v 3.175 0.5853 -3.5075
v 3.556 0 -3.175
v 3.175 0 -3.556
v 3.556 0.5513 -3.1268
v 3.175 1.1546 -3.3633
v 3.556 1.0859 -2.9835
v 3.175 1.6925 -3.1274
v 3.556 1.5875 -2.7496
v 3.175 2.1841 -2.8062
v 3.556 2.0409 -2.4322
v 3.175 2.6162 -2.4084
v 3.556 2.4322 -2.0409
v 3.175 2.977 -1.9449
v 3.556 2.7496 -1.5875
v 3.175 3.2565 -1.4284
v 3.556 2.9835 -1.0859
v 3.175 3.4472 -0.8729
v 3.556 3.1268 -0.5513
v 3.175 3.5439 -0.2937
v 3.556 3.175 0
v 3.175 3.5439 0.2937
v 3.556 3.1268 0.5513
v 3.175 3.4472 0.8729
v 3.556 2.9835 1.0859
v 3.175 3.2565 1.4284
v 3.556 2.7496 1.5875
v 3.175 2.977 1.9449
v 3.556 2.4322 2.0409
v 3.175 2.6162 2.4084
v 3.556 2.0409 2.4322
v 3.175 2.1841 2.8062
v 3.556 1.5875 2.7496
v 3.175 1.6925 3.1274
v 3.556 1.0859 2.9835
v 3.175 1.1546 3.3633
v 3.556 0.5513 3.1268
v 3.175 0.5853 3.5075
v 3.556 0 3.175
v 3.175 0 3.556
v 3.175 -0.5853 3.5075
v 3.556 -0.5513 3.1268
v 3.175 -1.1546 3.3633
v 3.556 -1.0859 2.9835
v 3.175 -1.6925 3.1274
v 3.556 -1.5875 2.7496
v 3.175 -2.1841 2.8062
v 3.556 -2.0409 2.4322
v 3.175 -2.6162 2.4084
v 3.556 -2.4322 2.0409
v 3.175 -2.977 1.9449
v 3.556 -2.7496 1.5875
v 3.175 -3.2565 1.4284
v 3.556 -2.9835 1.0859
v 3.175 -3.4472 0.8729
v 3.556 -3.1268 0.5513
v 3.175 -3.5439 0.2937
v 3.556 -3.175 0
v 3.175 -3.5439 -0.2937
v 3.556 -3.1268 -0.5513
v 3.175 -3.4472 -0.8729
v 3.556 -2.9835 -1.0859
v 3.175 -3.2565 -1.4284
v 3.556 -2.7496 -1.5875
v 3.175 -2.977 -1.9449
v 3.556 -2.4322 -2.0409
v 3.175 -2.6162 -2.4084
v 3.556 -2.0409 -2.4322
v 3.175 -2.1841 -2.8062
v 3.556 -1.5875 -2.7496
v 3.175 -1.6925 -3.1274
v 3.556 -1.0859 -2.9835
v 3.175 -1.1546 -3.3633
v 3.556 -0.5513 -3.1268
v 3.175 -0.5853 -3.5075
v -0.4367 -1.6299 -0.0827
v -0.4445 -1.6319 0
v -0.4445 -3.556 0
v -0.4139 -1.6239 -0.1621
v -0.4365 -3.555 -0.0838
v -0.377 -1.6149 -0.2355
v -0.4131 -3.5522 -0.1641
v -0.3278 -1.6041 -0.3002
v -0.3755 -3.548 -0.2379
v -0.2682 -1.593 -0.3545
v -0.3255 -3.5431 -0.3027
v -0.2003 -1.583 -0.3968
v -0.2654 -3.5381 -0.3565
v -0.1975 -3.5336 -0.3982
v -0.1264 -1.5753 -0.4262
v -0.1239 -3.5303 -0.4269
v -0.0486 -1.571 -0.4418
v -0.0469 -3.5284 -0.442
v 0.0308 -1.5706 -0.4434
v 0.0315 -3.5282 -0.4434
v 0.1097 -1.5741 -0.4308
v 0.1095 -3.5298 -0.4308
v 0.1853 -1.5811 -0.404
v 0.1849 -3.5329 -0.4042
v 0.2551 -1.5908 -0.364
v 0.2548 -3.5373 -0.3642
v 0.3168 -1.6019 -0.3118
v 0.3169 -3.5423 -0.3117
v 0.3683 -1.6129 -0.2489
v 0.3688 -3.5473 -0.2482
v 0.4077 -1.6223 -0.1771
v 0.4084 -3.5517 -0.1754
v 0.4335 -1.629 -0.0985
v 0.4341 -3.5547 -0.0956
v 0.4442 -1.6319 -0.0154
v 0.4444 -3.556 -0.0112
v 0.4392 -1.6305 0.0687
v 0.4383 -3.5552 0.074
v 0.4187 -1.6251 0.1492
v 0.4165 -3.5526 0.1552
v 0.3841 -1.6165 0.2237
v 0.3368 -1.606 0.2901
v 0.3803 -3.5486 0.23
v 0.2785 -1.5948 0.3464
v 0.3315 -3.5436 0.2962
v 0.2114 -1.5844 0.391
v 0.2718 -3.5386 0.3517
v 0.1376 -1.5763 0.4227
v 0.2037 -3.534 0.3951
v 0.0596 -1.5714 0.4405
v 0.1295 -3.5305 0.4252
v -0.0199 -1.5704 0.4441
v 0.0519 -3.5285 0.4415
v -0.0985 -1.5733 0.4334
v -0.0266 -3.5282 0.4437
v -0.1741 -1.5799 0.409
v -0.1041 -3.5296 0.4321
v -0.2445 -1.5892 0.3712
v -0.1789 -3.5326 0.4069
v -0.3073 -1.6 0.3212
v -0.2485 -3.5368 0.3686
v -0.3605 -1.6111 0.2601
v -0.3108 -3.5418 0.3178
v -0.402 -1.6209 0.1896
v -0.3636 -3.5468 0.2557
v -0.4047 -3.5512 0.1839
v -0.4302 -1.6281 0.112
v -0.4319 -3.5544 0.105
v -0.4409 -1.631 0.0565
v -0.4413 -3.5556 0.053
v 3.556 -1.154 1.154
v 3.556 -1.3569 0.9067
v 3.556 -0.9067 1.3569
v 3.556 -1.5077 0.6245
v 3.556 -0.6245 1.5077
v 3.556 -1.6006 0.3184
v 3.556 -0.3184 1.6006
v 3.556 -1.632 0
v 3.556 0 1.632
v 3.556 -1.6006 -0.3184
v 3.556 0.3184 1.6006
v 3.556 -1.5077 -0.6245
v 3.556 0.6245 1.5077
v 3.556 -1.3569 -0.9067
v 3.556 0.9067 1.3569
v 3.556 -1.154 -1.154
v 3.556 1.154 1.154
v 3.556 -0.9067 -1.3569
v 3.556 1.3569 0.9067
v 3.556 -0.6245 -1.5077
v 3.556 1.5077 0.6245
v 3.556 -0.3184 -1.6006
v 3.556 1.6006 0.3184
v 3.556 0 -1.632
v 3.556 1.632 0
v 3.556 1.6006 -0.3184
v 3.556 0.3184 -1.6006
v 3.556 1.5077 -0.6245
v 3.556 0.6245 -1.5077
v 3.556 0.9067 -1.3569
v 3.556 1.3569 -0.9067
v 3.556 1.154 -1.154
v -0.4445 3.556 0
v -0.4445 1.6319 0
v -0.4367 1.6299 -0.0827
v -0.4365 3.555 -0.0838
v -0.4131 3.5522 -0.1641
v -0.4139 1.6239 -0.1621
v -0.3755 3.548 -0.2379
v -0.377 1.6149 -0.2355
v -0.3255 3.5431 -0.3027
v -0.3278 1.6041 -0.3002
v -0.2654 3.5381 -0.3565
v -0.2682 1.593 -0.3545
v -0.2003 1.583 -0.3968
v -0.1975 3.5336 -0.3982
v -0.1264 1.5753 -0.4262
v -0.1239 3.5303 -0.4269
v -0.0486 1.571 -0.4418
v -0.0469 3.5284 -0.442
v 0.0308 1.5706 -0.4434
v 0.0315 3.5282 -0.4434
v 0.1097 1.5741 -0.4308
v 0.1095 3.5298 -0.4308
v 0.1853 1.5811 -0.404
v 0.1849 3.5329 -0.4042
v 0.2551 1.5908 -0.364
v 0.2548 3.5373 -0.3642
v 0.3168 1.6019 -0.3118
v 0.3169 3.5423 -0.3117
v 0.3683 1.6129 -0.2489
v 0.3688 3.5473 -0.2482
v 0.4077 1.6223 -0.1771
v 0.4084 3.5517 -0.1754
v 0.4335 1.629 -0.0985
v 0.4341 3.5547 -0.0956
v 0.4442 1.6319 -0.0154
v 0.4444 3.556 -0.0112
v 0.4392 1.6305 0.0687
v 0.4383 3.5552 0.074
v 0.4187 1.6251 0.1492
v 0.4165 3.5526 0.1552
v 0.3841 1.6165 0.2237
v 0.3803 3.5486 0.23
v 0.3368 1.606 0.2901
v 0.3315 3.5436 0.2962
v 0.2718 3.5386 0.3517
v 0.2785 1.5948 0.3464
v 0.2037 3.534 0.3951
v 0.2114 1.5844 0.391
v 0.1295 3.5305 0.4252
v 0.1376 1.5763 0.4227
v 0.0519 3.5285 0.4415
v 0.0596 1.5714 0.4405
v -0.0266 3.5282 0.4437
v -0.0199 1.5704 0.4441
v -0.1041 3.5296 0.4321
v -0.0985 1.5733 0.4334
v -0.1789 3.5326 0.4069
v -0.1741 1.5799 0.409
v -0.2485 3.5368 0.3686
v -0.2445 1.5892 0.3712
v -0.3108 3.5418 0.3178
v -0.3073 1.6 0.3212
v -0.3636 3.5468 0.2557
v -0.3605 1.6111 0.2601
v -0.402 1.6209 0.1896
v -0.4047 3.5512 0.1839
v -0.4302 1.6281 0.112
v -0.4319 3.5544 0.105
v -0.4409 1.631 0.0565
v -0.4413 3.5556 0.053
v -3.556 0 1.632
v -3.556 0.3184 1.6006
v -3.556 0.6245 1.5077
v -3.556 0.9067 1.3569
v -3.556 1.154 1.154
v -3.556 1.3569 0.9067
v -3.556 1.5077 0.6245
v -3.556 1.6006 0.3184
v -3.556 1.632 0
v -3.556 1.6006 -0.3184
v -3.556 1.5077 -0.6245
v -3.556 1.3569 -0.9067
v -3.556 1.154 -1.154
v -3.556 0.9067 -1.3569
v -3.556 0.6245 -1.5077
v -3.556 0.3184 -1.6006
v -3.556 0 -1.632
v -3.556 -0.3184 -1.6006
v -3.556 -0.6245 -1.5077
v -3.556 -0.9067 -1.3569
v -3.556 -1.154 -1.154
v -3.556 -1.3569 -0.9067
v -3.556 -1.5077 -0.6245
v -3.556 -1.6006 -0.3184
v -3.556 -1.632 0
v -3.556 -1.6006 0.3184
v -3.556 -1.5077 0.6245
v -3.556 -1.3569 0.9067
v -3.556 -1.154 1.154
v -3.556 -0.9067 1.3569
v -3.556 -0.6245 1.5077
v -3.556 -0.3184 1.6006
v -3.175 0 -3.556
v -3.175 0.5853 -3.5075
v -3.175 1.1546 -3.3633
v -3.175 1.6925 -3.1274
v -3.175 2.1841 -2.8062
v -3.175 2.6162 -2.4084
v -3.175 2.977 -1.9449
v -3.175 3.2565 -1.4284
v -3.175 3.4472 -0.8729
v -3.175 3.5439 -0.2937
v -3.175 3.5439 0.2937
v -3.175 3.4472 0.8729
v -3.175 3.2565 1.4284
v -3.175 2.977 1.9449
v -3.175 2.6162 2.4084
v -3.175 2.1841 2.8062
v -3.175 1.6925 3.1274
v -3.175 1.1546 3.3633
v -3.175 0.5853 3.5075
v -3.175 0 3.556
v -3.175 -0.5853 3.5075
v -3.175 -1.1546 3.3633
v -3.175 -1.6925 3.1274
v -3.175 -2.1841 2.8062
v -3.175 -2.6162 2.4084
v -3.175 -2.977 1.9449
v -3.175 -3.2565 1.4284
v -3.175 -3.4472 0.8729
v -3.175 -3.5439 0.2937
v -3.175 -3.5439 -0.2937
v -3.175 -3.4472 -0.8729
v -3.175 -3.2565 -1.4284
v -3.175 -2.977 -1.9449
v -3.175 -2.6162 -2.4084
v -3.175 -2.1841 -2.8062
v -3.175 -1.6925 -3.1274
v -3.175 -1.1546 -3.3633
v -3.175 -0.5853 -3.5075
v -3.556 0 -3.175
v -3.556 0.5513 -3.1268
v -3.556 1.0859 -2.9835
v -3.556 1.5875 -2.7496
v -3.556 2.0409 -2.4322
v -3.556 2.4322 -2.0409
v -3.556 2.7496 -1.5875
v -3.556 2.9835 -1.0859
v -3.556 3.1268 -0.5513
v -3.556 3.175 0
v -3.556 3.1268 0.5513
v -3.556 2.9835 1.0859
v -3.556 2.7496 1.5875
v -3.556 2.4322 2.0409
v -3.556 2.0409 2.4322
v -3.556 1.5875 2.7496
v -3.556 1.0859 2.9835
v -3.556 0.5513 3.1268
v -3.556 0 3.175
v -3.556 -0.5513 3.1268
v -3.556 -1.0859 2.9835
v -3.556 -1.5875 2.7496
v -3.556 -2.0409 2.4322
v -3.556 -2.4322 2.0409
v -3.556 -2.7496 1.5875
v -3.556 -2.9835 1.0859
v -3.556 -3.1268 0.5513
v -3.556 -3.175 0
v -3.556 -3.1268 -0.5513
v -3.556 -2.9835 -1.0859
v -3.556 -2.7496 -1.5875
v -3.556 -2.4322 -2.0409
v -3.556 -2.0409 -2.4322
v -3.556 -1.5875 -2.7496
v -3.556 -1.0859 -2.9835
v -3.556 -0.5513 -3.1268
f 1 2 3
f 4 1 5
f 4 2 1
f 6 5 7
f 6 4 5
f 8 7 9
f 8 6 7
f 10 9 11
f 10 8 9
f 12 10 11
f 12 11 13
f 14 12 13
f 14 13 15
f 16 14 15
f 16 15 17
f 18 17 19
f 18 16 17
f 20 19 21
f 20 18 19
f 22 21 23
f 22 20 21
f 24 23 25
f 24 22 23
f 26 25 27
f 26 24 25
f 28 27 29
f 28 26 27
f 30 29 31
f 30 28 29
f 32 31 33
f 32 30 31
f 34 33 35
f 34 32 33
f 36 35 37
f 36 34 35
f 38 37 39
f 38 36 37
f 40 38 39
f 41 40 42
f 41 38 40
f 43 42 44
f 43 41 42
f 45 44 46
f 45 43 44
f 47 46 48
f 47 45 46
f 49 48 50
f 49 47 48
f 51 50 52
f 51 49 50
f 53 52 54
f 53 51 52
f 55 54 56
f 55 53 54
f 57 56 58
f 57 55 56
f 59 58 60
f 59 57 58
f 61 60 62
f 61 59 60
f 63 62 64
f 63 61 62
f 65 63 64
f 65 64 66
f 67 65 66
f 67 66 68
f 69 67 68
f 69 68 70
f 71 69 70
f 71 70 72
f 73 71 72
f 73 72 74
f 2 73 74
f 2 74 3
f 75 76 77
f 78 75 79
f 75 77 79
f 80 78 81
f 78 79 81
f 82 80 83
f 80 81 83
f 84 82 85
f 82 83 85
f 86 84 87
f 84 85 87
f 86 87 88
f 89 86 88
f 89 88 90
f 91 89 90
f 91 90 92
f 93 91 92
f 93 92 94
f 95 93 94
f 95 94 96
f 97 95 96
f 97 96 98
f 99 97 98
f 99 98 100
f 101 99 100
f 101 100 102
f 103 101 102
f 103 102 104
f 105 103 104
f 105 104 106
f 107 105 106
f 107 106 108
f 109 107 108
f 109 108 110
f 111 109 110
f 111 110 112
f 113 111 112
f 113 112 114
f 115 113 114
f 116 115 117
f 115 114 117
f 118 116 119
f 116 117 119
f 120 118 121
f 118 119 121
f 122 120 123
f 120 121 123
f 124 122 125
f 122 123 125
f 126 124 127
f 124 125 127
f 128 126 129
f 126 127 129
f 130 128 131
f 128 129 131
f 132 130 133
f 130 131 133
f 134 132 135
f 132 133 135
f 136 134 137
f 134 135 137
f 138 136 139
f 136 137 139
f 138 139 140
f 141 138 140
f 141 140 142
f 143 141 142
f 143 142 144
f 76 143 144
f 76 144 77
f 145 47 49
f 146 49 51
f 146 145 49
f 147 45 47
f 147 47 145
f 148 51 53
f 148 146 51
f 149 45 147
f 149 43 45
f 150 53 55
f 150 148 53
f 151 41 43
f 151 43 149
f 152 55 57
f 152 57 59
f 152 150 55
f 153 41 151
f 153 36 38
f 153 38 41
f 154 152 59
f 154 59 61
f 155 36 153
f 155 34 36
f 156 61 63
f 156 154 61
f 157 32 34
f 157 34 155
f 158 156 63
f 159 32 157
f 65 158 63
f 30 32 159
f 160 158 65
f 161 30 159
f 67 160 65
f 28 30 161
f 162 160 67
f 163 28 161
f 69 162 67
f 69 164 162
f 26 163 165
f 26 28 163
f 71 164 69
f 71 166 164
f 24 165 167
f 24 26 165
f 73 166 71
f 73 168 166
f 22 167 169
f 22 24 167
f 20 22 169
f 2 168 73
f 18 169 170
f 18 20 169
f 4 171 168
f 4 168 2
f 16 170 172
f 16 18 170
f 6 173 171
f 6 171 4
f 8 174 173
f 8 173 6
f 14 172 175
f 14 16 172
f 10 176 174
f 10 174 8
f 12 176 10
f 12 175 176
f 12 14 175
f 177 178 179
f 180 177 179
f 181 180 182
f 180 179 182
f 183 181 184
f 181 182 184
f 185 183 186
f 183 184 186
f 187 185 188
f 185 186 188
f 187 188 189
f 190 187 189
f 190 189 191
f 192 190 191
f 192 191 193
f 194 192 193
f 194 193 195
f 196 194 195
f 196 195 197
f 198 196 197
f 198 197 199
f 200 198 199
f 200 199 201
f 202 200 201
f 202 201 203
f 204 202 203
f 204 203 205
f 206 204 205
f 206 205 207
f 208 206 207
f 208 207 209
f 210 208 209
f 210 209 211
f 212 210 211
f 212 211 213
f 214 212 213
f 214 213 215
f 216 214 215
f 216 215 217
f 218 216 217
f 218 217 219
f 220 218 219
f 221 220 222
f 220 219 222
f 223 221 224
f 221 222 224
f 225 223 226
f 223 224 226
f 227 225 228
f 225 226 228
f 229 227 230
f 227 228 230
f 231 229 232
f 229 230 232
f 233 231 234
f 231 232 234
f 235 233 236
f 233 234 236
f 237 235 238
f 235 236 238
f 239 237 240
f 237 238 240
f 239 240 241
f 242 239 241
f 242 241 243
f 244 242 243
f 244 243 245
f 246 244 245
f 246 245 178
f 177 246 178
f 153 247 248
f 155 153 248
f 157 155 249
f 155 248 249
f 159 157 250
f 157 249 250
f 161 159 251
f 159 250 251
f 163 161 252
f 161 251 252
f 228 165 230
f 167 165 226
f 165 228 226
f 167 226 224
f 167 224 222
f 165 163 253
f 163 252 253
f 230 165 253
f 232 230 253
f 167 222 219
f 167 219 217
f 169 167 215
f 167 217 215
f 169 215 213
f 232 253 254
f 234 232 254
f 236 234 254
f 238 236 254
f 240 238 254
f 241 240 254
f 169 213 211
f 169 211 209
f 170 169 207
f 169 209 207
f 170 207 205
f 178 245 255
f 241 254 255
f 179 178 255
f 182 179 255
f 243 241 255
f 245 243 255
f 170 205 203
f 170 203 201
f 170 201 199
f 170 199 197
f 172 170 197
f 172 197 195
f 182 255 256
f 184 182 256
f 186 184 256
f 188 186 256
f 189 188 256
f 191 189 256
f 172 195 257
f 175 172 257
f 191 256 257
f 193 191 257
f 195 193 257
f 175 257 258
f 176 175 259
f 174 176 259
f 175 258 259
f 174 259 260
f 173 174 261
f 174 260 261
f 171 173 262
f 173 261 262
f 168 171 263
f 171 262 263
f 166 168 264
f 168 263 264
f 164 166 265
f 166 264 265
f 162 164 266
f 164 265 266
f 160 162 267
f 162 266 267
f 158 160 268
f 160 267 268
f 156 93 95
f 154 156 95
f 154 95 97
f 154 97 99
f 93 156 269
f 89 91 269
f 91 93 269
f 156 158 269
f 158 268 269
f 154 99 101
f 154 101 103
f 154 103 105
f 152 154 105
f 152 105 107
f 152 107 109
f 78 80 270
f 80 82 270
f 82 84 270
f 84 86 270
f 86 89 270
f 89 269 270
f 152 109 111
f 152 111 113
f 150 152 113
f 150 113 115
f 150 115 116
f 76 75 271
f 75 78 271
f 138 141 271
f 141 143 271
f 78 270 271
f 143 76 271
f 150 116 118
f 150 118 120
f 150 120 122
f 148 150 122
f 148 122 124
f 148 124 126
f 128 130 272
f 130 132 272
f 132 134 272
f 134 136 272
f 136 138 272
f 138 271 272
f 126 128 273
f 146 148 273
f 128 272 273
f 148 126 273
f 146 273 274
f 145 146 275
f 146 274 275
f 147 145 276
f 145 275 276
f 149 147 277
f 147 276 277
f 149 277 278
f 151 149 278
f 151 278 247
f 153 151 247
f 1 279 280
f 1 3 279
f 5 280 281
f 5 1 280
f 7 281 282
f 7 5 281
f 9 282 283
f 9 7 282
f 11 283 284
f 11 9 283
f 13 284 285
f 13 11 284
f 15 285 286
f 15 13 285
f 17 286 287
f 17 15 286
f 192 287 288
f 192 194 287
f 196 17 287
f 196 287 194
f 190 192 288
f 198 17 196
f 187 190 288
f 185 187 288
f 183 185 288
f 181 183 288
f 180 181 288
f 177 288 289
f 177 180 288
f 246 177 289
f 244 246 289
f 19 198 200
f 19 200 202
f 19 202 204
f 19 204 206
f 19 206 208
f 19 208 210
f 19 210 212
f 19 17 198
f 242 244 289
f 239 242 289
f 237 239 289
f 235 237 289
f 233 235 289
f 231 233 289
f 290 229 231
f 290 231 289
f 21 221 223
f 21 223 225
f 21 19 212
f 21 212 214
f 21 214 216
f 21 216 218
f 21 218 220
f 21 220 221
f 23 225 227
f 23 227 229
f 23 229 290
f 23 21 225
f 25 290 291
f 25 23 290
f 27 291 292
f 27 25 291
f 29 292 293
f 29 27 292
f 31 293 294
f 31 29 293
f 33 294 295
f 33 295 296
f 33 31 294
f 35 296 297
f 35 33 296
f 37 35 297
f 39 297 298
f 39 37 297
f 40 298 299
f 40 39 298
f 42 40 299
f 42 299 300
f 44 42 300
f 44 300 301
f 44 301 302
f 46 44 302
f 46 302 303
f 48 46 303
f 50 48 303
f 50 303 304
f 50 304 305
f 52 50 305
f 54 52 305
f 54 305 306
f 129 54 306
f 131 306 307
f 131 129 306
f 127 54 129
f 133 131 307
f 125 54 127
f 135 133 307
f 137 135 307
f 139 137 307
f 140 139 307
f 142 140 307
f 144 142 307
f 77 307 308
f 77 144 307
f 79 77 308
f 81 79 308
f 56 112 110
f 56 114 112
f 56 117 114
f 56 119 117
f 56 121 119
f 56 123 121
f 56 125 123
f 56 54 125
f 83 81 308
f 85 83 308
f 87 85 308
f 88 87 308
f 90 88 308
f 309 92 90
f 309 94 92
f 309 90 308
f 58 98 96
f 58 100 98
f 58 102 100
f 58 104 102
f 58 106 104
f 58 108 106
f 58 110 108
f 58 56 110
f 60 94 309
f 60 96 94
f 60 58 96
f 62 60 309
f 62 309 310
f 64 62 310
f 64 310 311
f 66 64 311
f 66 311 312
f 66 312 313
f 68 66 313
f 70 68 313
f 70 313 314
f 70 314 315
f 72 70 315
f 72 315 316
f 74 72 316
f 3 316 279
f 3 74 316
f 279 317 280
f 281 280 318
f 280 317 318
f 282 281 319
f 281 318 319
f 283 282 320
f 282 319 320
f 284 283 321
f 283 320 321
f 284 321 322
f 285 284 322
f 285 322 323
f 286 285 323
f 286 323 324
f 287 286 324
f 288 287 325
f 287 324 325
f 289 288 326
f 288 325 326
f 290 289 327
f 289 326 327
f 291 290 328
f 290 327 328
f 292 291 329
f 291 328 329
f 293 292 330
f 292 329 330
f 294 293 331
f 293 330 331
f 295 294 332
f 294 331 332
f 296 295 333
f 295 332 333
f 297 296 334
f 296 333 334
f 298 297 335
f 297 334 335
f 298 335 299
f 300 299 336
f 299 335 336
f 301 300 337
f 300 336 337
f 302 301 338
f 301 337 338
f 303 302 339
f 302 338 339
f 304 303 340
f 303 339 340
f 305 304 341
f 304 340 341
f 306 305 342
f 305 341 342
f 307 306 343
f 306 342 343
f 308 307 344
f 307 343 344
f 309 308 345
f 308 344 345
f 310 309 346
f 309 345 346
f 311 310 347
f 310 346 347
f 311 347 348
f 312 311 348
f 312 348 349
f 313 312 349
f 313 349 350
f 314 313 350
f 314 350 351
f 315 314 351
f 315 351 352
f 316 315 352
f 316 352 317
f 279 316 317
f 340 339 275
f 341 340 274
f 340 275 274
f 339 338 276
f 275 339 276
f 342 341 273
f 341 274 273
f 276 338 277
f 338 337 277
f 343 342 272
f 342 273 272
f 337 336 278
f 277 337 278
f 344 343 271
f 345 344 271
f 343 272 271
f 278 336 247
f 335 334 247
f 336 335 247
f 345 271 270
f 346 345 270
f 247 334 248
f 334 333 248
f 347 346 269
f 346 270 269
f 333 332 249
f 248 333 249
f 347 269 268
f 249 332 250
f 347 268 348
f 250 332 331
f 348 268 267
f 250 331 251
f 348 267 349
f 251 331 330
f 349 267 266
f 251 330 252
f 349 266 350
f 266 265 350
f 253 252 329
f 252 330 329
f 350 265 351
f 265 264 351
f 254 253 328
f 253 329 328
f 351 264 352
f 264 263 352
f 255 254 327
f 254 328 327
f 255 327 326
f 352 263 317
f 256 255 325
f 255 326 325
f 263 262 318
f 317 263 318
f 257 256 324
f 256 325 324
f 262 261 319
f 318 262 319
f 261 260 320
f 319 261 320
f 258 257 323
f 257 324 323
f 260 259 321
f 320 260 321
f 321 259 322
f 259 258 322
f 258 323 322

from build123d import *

# Parameters (mm, degrees)
SKETCH1_R                    = 3.556
BOSS_EXTRUDE1_DEPTH          = 3.556
F_30_0_1285_DIAMETER_HOLE1_D = 3.2639
CHAMFER2_SIZE                = 0.381
F_65_0_035_DIAMETER_HOLE2_D  = 0.889


with BuildPart() as part:
    # Sketch1 → Boss-Extrude1 (new, symmetric)
    with BuildSketch(Plane(origin=(0, 0, 0), x_dir=(0, 0, -1), z_dir=(1, 0, 0))):
        Circle(SKETCH1_R)
    extrude(amount=BOSS_EXTRUDE1_DEPTH, both=True)

    # #30 (0.1285) Diameter Hole1 (through all)
    with Locations(Plane(origin=(3.556, 0, 0), x_dir=(0, 0, -1), z_dir=(1, 0, 0))):
        with Locations((0, 0)):
            Hole(F_30_0_1285_DIAMETER_HOLE1_D / 2)

    # Chamfer2
    chamfer2_edges = [part.edges().sort_by_distance(p)[0] for p in [
        (-3.556, 0, 3.556),
        (3.556, 0, 3.556),
    ]]
    chamfer(chamfer2_edges, length=CHAMFER2_SIZE)

    # #65 (0.035) Diameter Hole2 (through all)
    with Locations(Plane(origin=(0, 3.556, 0), x_dir=(1, 0, 0), z_dir=(0, 1, 0))):
        with Locations((0, 0)):
            Hole(F_65_0_035_DIAMETER_HOLE2_D / 2)


solid = part.part
